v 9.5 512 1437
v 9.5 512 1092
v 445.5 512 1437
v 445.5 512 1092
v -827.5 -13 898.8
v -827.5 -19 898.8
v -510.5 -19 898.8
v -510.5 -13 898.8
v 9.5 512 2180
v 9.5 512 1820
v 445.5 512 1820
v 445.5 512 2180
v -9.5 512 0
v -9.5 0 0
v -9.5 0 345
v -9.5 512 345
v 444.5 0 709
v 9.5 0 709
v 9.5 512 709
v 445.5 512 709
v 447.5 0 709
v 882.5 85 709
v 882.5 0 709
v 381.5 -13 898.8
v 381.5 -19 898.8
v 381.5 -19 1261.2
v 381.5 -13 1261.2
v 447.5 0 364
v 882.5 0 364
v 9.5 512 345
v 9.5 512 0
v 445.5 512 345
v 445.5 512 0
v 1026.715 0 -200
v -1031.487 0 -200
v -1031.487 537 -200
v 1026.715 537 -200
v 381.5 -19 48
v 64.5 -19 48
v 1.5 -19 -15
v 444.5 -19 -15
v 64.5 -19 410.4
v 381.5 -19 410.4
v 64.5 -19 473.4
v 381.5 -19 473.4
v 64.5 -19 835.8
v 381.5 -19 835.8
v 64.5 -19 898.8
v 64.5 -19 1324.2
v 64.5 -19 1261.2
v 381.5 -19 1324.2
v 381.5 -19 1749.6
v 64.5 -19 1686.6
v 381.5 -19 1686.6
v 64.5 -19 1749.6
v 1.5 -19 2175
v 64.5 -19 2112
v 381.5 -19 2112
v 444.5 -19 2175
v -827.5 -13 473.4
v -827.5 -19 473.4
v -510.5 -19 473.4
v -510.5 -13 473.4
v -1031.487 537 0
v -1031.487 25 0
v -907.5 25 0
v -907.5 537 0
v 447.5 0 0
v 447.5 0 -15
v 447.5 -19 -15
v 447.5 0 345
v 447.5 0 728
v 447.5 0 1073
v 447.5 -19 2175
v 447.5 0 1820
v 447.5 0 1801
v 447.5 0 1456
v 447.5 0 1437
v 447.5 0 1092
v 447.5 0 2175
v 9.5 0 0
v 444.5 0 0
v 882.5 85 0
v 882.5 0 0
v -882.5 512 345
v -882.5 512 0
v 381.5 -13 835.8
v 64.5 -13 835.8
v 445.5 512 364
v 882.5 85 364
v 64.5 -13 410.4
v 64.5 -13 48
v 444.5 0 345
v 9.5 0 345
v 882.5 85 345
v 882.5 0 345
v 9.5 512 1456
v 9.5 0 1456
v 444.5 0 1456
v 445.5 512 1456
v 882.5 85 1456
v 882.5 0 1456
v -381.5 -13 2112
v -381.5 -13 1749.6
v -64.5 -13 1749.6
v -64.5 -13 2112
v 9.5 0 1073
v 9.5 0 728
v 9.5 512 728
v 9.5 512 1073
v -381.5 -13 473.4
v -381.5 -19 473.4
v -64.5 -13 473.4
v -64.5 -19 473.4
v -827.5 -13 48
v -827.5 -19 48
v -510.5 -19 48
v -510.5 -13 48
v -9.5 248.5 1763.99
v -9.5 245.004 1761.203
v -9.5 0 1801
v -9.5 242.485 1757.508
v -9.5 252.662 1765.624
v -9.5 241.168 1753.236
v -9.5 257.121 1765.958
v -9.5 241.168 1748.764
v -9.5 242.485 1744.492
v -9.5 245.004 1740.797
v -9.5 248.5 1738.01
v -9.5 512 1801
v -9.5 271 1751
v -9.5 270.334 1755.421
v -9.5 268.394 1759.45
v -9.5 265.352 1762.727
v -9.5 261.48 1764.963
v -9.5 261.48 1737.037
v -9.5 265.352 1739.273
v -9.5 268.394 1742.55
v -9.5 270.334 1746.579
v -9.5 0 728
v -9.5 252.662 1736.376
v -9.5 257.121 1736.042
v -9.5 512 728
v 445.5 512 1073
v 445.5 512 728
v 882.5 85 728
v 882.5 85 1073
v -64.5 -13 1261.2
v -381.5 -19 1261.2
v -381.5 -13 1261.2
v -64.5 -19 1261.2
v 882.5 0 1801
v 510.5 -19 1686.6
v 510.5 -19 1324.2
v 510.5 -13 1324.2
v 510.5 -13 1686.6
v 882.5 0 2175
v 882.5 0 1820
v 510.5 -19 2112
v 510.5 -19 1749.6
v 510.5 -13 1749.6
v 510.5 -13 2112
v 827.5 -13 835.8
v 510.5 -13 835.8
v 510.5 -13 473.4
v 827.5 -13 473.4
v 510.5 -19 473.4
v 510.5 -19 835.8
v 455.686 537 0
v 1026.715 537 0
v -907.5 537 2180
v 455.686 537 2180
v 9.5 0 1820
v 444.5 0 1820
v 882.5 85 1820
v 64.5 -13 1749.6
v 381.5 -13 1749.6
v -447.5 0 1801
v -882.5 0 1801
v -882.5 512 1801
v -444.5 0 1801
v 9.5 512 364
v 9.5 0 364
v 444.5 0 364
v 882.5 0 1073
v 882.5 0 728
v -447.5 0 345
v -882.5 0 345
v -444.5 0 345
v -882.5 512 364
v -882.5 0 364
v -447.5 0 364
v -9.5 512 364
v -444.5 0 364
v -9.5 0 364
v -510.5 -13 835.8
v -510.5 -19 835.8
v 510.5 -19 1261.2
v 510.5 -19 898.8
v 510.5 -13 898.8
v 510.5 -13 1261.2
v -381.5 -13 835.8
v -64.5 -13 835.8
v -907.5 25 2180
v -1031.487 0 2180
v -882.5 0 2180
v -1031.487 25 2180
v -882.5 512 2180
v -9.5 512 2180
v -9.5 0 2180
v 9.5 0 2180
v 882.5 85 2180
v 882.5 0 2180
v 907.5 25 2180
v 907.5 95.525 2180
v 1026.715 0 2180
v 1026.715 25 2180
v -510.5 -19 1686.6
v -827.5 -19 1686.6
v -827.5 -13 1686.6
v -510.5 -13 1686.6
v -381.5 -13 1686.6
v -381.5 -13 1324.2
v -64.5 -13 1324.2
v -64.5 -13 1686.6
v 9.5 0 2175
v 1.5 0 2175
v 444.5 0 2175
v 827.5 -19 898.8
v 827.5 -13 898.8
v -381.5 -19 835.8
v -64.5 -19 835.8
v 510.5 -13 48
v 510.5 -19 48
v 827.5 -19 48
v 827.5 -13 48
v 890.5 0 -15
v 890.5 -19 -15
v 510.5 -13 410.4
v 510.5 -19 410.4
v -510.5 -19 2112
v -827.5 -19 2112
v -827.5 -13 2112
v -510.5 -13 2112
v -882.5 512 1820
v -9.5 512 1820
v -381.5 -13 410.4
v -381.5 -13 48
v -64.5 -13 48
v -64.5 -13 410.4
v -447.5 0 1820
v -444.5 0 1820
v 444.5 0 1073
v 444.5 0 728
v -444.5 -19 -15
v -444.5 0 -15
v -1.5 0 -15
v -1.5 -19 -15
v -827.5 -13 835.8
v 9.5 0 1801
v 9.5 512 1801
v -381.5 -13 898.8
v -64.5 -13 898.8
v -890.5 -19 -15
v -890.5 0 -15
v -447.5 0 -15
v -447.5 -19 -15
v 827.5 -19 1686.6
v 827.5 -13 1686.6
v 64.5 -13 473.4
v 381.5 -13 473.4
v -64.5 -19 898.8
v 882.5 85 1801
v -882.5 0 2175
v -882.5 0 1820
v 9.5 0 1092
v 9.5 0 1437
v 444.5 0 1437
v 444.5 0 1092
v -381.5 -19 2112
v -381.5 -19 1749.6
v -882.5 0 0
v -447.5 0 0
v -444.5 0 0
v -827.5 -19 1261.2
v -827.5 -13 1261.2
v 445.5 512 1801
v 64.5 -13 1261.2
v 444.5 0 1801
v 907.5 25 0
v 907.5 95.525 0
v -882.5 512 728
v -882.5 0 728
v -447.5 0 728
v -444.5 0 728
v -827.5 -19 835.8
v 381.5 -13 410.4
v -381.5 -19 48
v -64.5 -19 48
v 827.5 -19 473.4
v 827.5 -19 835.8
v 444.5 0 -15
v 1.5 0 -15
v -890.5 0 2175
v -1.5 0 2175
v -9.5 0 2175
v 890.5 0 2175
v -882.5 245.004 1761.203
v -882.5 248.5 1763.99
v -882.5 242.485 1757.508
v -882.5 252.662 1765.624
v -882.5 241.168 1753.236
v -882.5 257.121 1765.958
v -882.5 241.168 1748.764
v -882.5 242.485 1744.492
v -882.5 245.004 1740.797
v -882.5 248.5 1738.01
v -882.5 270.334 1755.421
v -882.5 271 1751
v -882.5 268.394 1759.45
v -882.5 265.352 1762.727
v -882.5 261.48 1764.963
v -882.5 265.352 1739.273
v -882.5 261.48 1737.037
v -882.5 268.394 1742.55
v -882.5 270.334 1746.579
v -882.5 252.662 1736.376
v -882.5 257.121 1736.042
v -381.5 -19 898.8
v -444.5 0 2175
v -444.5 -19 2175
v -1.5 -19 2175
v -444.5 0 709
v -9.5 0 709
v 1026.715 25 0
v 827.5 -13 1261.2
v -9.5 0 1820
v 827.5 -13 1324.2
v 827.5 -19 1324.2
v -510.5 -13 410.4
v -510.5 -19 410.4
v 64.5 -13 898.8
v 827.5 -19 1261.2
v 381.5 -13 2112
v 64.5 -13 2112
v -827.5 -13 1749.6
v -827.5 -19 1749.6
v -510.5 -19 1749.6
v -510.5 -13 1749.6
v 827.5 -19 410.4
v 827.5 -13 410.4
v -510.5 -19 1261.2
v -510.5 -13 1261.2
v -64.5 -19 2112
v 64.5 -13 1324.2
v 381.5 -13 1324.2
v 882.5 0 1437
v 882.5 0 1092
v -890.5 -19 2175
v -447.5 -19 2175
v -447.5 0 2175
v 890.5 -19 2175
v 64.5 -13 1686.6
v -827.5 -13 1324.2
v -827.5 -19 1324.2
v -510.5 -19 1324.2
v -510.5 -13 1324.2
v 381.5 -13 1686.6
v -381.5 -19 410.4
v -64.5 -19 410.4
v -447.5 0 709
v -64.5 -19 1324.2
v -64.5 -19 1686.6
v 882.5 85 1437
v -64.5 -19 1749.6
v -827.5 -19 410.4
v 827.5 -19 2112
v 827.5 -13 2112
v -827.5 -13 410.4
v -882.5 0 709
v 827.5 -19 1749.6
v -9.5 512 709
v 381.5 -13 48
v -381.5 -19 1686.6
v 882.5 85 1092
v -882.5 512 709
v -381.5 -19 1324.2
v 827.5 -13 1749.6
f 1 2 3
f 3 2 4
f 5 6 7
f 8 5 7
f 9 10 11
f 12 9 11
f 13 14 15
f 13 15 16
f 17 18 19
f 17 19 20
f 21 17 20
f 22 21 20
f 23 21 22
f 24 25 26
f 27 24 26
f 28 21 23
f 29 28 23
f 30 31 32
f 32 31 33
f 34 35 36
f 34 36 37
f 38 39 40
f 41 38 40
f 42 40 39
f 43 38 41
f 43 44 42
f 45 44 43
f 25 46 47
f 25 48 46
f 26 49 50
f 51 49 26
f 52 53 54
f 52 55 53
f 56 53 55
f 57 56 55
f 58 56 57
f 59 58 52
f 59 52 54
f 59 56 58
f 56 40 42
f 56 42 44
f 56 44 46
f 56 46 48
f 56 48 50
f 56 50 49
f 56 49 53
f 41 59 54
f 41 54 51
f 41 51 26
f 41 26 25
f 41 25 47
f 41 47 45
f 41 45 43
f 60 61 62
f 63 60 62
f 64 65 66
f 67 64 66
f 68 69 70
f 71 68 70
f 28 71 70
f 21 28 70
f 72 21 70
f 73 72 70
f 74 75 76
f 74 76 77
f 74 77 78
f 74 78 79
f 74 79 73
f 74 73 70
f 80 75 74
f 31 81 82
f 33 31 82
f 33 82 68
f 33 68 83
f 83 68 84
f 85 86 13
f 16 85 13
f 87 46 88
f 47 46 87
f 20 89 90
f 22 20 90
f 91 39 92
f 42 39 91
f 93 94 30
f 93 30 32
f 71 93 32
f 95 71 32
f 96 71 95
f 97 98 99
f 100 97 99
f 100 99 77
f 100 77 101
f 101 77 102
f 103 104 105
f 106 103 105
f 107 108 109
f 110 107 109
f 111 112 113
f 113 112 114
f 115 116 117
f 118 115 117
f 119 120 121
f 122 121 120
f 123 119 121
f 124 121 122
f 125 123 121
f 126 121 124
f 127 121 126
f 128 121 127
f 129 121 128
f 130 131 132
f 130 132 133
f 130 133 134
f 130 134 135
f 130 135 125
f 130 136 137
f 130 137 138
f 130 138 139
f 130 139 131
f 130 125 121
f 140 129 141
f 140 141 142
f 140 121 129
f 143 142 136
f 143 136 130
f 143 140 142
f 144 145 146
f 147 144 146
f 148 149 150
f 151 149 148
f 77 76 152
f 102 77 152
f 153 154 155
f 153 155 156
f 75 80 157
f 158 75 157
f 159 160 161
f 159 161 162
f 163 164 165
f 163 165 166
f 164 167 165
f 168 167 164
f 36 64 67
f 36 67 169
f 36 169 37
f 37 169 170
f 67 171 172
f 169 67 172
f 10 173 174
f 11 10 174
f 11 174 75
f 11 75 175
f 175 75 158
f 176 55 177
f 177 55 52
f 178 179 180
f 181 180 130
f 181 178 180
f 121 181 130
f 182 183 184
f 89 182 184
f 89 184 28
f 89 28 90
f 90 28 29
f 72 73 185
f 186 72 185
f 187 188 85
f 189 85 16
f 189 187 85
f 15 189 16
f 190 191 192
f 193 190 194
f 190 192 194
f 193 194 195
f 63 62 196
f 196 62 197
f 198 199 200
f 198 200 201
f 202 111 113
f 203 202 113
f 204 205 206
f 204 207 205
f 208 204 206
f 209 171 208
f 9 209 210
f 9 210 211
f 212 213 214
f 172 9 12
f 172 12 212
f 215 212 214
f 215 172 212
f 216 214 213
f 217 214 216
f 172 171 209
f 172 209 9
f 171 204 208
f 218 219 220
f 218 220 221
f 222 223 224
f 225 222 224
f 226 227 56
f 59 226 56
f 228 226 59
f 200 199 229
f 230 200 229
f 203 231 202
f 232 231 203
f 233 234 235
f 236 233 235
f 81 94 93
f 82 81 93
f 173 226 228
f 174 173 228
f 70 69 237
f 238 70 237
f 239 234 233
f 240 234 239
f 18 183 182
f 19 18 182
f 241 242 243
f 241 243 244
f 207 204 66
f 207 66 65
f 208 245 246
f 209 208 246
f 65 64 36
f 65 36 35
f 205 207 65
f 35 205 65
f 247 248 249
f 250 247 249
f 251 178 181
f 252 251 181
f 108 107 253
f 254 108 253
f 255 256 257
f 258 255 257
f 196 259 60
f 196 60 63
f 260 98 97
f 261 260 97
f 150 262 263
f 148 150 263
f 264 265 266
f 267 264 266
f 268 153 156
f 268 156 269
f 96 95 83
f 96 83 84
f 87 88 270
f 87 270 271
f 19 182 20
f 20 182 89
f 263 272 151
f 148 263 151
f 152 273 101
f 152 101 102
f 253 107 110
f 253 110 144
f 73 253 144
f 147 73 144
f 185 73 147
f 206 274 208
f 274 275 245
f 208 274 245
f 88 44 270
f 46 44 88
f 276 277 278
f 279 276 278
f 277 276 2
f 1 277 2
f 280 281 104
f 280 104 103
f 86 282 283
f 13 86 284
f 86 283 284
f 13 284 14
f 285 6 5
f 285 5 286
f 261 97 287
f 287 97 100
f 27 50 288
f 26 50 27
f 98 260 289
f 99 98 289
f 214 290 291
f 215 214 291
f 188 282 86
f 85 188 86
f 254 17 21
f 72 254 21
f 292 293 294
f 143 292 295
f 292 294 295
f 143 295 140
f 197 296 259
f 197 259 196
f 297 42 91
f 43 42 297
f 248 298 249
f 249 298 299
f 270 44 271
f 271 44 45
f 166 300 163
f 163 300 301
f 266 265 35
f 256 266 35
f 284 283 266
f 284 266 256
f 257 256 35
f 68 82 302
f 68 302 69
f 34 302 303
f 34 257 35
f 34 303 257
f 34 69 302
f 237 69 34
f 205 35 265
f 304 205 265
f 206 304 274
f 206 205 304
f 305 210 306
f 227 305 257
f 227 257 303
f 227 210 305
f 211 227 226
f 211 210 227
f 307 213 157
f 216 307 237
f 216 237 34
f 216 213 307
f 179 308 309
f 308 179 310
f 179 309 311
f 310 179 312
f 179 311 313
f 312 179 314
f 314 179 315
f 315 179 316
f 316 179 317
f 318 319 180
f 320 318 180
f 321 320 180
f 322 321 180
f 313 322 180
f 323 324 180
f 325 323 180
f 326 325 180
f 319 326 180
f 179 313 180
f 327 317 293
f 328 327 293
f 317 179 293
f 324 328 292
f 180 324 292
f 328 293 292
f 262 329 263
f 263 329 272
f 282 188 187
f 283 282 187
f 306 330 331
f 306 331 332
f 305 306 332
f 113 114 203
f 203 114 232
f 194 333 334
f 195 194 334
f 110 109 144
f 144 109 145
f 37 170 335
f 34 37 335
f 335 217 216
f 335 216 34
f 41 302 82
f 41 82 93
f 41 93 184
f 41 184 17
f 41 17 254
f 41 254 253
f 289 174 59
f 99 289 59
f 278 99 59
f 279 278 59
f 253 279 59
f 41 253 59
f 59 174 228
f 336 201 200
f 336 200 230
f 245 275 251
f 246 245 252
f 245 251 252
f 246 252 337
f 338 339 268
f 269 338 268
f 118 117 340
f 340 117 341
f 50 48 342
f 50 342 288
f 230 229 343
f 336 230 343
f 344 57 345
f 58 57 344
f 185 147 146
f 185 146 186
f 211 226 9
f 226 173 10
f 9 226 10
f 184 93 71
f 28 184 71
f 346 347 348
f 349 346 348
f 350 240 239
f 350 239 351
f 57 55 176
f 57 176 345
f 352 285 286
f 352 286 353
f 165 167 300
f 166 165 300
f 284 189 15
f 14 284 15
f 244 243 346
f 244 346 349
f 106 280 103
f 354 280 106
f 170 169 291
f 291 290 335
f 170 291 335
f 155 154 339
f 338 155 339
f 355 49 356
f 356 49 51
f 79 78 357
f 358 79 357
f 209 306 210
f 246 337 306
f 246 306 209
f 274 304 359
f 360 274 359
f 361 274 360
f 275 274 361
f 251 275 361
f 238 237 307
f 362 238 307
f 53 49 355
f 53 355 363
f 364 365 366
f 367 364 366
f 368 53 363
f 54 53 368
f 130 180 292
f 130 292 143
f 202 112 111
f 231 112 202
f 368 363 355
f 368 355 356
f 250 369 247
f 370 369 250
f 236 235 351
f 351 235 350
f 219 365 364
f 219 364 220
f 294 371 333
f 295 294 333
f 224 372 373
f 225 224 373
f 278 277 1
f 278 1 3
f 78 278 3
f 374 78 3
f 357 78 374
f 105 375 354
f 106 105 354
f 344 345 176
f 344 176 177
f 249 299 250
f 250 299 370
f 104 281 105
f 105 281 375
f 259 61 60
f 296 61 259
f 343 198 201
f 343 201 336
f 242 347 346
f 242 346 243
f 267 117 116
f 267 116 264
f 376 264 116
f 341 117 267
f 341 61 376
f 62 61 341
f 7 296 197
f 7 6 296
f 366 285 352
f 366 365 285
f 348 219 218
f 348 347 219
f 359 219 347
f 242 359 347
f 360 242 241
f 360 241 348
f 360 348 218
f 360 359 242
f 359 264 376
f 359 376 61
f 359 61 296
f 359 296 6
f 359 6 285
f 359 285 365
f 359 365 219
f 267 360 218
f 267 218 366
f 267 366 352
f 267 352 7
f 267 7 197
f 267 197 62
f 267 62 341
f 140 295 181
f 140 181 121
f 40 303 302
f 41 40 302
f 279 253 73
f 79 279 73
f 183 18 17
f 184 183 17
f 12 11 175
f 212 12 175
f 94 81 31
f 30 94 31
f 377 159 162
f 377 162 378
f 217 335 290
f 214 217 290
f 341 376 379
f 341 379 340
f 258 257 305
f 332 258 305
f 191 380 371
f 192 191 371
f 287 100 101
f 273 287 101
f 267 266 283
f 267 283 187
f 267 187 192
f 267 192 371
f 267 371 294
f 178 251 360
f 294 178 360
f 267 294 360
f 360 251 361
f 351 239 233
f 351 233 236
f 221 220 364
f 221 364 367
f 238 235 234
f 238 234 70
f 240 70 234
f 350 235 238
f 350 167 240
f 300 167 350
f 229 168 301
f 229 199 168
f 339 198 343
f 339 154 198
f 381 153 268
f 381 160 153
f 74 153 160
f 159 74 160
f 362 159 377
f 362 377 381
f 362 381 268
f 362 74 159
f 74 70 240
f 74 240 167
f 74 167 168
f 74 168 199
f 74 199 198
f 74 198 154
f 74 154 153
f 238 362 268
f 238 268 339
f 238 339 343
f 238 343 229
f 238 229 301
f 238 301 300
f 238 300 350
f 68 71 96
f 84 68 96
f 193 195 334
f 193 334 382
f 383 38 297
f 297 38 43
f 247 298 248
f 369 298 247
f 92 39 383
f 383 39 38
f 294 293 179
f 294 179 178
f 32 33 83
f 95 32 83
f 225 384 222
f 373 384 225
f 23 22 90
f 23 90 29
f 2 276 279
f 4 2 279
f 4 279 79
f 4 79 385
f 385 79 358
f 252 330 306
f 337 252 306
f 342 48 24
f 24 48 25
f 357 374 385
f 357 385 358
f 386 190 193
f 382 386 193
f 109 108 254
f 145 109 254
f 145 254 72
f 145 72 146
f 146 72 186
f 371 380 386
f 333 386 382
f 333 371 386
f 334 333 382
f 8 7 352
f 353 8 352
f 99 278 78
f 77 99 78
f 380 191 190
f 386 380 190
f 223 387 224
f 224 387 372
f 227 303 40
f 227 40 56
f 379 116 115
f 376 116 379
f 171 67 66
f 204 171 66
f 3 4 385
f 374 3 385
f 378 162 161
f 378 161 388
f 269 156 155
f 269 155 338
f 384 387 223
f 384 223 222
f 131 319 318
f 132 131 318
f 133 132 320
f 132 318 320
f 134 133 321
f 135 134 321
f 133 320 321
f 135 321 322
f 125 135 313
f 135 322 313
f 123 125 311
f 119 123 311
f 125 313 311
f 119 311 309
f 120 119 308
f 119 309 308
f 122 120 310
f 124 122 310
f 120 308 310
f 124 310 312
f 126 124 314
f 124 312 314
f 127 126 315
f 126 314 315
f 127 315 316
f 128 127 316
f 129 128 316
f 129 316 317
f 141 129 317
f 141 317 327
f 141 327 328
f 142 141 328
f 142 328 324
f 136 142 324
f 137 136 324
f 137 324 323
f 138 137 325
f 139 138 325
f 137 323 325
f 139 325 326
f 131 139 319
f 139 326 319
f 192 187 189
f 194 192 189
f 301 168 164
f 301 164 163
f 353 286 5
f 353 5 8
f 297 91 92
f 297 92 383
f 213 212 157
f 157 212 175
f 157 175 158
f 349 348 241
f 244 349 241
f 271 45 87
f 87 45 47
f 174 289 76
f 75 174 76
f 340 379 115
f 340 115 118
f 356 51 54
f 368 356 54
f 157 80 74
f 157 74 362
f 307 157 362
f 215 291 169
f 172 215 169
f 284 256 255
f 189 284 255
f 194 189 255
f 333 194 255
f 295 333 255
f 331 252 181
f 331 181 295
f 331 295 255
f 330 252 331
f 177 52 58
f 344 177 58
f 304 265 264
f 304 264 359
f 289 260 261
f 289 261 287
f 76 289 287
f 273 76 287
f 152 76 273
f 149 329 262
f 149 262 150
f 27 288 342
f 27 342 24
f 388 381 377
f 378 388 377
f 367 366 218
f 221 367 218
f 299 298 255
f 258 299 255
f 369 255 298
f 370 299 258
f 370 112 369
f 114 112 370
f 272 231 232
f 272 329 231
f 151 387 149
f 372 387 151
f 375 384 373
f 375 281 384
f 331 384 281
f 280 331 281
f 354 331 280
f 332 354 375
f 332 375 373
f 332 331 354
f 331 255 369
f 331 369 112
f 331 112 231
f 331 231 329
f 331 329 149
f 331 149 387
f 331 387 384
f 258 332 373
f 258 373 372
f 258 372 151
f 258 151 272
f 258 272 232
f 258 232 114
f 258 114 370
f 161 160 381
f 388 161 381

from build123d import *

# Parameters (mm, degrees)
F1_DEPTH  = 2180
F2_W      = 2058.2016706467
F2_H      = 537
F3_DEPTH  = 200
F4_W      = 19
F4_H      = 512
F5_DEPTH  = 2180
F6_W      = 443
F6_H      = 2190
F7_DEPTH  = 19
F8_W      = 317
F8_H      = 362.4
F9_DEPTH  = 6
F10_W     = 873
F10_H     = 19
F12_R     = 15
F13_DEPTH = 873


with BuildPart() as f1:
    # F0 (on Top) → F1 (new body)
    with BuildSketch(Plane.XY):
        Polygon((-1031.4865112305, 0), (-882.5, 0), (-882.5, 512), (445.5, 512), (882.5, 85), (882.5, 0), (1026.7151594162, 0), (1026.7151594162, 25), (907.5, 25), (907.5, 95.5252390221), (455.6862516456, 537), (-907.5, 537), (-907.5, 25), (-1031.4865112305, 25), align=None)
    extrude(amount=F1_DEPTH)

    # F2 (on face) → F3 (join)
    with BuildSketch(Plane(origin=(0, 0, 0), x_dir=(1, 0, 0), z_dir=(0, 0, -1))):
        with Locations((-2.3856759071, -268.5)):
            Rectangle(F2_W, F2_H)
    extrude(amount=F3_DEPTH)

    # F4 (on face) → F5 (join, through all)
    with BuildSketch(Plane.XY):
        with Locations((0, 256)):
            Rectangle(F4_W, F4_H)
    extrude(amount=F5_DEPTH)

    # F6 (on face) → F7 (join)
    with BuildSketch(Plane.XZ):
        with Locations((-223, 1080)):
            Rectangle(F6_W, F6_H)
        with Locations((-669, 1080)):
            Rectangle(F6_W, F6_H)
        with Locations((223, 1080)):
            Rectangle(F6_W, F6_H)
        with Locations((669, 1080)):
            Rectangle(F6_W, F6_H)
    extrude(amount=F7_DEPTH)

    # F8 (on face) → F9 (cut)
    with BuildSketch(Plane.XZ.offset(19)):
        with Locations((-669, 1930.8)):
            Rectangle(F8_W, F8_H)
        with Locations((-669, 1505.4)):
            Rectangle(F8_W, F8_H)
        with Locations((-669, 1080)):
            Rectangle(F8_W, F8_H)
        with Locations((-669, 654.6)):
            Rectangle(F8_W, F8_H)
        with Locations((-669, 229.2)):
            Rectangle(F8_W, F8_H)
        with Locations((-223, 1930.8)):
            Rectangle(F8_W, F8_H)
        with Locations((223, 1930.8)):
            Rectangle(F8_W, F8_H)
        with Locations((669, 1930.8)):
            Rectangle(F8_W, F8_H)
        with Locations((-223, 1505.4)):
            Rectangle(F8_W, F8_H)
        with Locations((223, 1505.4)):
            Rectangle(F8_W, F8_H)
        with Locations((669, 1505.4)):
            Rectangle(F8_W, F8_H)
        with Locations((-223, 1080)):
            Rectangle(F8_W, F8_H)
        with Locations((223, 1080)):
            Rectangle(F8_W, F8_H)
        with Locations((669, 1080)):
            Rectangle(F8_W, F8_H)
        with Locations((-223, 654.6)):
            Rectangle(F8_W, F8_H)
        with Locations((223, 654.6)):
            Rectangle(F8_W, F8_H)
        with Locations((669, 654.6)):
            Rectangle(F8_W, F8_H)
        with Locations((-223, 229.2)):
            Rectangle(F8_W, F8_H)
        with Locations((223, 229.2)):
            Rectangle(F8_W, F8_H)
        with Locations((669, 229.2)):
            Rectangle(F8_W, F8_H)
    extrude(amount=-F9_DEPTH, mode=Mode.SUBTRACT)

    # F10 (on face) → F11 (join, up to the next surface of F1)
    with BuildSketch(Plane.XZ):
        with Locations((-446, 354.5)):
            Rectangle(F10_W, F10_H)
        with Locations((-446, 1810.5)):
            Rectangle(F10_W, F10_H)
        with Locations((-446, 718.5)):
            Rectangle(F10_W, F10_H)
        with Locations((446, 354.5)):
            Rectangle(F10_W, F10_H)
        with Locations((446, 718.5)):
            Rectangle(F10_W, F10_H)
        with Locations((446, 1082.5)):
            Rectangle(F10_W, F10_H)
        with Locations((446, 1446.5)):
            Rectangle(F10_W, F10_H)
        with Locations((446, 1810.5)):
            Rectangle(F10_W, F10_H)
    extrude(until=Until.NEXT, dir=(0, 1, 0))

    # F12 (on face) → F13 (join, through all)
    with BuildSketch(Plane.YZ.offset(-882.5)):
        with Locations((256, 1751)):
            Circle(F12_R)
    extrude(amount=F13_DEPTH)


solid = f1.part
